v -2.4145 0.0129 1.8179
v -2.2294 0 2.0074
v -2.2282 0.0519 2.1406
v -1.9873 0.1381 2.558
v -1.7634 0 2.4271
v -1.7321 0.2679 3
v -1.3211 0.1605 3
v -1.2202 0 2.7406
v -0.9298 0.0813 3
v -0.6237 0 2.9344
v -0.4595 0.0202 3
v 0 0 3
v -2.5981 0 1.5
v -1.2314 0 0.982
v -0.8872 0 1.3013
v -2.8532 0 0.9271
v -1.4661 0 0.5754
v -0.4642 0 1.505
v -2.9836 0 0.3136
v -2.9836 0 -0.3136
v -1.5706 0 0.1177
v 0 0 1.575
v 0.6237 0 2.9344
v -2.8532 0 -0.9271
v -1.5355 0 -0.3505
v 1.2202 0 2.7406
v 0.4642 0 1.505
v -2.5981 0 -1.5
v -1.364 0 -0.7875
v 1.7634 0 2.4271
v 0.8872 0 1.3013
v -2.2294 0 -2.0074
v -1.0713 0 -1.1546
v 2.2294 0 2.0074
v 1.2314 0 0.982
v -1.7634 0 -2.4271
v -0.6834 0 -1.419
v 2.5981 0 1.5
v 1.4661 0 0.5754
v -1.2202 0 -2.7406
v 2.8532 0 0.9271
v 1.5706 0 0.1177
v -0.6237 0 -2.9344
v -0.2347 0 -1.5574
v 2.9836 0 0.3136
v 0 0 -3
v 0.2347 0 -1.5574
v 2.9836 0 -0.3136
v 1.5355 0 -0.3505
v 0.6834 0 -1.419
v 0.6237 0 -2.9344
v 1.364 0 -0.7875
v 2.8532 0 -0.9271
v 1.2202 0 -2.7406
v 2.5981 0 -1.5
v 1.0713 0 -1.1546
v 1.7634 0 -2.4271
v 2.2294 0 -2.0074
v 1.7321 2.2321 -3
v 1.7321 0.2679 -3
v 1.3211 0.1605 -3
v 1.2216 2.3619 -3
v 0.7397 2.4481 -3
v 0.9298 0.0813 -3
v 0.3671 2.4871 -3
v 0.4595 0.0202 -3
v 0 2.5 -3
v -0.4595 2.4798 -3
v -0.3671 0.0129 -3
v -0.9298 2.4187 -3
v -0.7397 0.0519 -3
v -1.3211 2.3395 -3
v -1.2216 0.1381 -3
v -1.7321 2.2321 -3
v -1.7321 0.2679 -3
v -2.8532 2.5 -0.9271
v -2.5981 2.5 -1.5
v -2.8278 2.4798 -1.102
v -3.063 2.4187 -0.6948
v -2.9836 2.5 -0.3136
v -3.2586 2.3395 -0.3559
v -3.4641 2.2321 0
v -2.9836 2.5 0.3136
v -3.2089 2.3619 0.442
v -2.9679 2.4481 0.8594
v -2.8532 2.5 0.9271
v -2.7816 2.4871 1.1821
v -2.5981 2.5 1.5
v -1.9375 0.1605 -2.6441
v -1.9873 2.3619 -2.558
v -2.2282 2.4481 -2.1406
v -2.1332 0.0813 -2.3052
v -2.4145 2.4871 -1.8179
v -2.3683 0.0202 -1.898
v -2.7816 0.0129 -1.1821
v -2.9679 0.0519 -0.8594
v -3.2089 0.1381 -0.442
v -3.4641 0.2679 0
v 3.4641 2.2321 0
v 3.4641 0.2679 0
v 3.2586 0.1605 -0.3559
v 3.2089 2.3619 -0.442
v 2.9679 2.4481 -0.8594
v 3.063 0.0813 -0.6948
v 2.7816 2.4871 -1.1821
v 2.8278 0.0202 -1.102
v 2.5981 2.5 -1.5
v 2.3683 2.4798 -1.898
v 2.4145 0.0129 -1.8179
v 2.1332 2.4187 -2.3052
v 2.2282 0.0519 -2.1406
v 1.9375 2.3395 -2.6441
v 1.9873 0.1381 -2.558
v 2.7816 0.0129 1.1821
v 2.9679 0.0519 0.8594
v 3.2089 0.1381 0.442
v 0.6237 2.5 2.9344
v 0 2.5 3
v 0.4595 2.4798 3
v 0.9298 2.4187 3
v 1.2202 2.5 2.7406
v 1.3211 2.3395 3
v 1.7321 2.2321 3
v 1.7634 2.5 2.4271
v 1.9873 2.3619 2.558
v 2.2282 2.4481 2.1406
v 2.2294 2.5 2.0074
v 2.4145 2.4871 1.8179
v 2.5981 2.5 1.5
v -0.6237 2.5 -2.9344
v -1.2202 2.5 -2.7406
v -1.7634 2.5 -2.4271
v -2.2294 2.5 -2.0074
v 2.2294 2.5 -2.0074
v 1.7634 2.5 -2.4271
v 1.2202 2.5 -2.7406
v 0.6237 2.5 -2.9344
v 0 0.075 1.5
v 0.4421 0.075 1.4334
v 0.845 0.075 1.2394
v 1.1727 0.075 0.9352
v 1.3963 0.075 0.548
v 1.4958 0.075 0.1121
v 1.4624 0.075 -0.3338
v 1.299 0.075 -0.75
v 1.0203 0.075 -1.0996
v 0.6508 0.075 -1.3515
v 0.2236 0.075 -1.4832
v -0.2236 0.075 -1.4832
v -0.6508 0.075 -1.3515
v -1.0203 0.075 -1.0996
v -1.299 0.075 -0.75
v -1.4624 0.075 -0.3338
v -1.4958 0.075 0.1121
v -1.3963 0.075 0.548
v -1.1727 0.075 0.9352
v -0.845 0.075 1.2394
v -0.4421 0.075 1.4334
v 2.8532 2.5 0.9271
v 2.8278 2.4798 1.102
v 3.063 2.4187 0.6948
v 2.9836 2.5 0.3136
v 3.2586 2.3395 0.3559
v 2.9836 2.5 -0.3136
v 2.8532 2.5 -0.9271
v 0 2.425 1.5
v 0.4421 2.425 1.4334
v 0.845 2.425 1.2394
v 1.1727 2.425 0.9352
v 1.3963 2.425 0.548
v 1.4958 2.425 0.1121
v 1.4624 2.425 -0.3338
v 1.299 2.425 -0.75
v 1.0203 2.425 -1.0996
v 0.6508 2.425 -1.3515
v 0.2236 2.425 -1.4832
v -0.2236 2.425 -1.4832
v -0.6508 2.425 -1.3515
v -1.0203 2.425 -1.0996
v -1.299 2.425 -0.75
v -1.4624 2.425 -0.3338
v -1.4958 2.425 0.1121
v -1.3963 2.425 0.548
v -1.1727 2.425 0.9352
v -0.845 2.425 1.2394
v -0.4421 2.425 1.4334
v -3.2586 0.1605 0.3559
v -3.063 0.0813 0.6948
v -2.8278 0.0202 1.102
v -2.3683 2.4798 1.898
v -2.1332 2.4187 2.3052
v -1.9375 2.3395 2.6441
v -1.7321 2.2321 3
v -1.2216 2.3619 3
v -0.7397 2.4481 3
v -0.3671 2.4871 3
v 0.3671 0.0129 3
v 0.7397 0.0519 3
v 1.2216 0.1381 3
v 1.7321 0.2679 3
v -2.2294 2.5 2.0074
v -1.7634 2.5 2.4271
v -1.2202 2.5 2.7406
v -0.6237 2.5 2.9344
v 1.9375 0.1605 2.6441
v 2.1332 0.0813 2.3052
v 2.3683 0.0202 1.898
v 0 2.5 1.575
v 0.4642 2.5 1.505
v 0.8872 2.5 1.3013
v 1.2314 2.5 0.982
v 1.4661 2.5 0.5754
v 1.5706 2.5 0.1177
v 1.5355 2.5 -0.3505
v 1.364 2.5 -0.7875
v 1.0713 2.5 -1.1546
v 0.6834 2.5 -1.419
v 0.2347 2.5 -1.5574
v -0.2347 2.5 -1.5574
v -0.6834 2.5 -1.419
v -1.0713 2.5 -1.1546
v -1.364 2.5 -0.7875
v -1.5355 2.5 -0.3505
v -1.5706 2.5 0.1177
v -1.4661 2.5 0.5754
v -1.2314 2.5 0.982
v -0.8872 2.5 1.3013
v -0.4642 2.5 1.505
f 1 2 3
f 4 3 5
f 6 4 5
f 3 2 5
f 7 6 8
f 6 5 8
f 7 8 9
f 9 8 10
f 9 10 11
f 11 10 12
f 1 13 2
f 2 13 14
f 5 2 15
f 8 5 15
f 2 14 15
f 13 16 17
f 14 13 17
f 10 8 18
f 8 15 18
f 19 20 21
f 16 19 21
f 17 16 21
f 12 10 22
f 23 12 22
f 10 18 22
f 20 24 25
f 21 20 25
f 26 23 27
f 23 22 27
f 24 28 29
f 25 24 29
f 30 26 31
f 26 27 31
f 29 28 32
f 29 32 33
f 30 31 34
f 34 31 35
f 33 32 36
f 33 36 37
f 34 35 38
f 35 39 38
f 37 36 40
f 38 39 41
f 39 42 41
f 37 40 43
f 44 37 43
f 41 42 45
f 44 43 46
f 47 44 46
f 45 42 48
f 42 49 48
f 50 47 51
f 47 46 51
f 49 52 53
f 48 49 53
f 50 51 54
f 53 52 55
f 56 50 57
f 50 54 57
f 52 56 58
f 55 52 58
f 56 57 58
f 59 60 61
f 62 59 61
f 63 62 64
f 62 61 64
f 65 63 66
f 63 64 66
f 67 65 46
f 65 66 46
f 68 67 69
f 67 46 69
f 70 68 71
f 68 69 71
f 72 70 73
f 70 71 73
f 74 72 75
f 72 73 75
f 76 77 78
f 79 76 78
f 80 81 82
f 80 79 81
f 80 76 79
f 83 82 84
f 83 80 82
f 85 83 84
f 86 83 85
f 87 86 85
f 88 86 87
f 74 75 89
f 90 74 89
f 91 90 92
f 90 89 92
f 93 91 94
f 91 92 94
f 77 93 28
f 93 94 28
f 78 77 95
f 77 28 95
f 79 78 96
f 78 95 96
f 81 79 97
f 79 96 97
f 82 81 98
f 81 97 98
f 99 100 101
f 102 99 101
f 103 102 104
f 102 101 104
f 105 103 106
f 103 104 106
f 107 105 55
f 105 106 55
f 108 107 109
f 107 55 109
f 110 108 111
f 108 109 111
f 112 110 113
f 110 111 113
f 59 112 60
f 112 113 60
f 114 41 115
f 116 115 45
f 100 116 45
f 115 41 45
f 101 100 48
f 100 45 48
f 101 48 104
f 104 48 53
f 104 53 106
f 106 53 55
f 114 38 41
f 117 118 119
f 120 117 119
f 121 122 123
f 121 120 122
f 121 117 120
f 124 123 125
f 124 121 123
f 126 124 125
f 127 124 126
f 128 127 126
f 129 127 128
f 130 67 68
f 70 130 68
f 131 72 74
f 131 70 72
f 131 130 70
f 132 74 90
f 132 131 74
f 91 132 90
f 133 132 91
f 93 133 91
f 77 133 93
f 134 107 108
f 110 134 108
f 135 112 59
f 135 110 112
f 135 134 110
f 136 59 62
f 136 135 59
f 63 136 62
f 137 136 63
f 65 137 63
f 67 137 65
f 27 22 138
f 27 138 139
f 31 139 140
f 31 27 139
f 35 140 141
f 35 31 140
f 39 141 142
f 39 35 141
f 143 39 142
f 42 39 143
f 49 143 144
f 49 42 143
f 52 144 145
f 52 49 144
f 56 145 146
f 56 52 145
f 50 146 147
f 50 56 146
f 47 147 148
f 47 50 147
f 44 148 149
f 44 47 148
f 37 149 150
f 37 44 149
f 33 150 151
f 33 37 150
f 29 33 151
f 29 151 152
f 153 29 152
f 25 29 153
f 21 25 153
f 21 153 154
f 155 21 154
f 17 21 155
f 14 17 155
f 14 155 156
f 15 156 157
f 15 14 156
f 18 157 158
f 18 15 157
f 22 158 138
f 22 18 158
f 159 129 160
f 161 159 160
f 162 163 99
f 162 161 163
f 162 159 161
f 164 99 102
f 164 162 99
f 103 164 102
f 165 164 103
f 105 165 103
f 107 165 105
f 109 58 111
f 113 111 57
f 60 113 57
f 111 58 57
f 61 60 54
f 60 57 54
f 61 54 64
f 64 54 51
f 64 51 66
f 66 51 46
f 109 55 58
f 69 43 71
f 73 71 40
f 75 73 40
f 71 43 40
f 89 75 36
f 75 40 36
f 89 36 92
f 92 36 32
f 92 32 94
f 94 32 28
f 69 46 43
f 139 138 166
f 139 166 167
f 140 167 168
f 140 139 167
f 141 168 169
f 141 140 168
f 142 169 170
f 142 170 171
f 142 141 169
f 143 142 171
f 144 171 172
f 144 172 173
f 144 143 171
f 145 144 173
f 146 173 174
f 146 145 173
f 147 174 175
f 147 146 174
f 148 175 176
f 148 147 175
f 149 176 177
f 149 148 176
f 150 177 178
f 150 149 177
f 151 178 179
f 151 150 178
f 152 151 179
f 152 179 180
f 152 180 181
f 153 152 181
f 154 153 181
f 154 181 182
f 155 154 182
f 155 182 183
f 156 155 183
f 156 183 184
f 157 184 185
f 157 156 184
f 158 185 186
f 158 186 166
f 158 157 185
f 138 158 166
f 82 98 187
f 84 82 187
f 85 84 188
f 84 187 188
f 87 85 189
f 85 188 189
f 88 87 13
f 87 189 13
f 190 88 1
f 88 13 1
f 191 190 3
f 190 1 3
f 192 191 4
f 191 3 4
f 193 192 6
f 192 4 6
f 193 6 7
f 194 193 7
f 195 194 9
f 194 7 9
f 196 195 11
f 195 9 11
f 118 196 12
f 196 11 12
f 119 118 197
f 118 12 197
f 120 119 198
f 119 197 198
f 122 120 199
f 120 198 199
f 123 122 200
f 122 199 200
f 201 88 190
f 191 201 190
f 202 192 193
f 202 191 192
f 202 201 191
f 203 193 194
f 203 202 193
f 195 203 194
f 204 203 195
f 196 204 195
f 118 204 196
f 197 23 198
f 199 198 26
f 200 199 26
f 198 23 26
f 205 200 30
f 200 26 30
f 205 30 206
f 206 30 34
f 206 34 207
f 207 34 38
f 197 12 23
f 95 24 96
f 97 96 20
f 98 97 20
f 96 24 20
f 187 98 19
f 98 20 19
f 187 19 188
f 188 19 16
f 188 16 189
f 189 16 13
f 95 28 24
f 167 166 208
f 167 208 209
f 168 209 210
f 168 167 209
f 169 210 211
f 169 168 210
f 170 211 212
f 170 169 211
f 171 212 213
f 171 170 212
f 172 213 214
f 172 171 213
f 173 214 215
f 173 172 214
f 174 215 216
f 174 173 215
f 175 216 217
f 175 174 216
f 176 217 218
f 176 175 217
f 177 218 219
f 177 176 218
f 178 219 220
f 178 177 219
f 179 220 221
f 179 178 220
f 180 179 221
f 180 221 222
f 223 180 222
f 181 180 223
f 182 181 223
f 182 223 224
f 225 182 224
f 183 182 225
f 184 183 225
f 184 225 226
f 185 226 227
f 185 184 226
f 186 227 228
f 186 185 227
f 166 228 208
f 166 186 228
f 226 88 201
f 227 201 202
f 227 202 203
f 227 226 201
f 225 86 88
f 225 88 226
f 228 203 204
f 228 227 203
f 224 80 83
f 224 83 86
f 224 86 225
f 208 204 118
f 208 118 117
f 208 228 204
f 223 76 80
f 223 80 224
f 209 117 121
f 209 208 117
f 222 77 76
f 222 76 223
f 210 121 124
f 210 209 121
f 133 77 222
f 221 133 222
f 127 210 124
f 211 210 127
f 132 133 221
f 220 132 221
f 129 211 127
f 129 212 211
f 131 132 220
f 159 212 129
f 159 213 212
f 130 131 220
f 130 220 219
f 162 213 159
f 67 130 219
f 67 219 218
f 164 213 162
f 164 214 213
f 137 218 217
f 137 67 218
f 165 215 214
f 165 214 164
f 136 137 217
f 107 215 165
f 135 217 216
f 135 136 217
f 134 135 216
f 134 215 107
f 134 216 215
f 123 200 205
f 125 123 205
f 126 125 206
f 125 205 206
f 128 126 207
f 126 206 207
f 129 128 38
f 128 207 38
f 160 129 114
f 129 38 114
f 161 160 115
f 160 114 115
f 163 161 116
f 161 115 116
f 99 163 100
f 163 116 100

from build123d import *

# Parameters (mm, degrees)
SKETCH2_R           = 1.5
BOSS_EXTRUDE1_DEPTH = 2.5
SKETCH3_OUTSIDE_W   = 22.086
SKETCH3_OUTSIDE_H   = 21.158
SKETCH3_OUTSIDE_R   = 3
CUT_EXTRUDE1_DEPTH  = 3.25
CUT_EXTRUDE1_DRAFT  = 60
SKETCH4_OUTSIDE_W   = 22.086
SKETCH4_OUTSIDE_H   = 21.158
SKETCH4_OUTSIDE_R   = 3
CUT_EXTRUDE2_DEPTH  = 3.25
CUT_EXTRUDE2_DRAFT  = -60
CHAMFER1_SIZE       = 0.075


with BuildPart() as part:
    # Sketch2 → Boss-Extrude1 (new body)
    with BuildSketch(Plane(origin=(0, 0, 0), x_dir=(1, 0, 0), z_dir=(0, 1, 0))):
        Polygon((3.464101615, 0), (1.732050808, 3), (-1.732050808, 3), (-3.464101615, 0), (-1.732050808, -3), (1.732050808, -3), align=None)
        with Locations(Location((0, 0, 0), (0, 0, 270))):
            Circle(SKETCH2_R, mode=Mode.SUBTRACT)
    extrude(amount=BOSS_EXTRUDE1_DEPTH)


with BuildPart() as cut_extrude1_tool:
    # Sketch3 outside → Cut-Extrude1 (with draft: the straight prism first)
    with BuildSketch(Plane(origin=(0, 0, 0), x_dir=(1, 0, 0), z_dir=(0, 1, 0))):
        Rectangle(SKETCH3_OUTSIDE_W, SKETCH3_OUTSIDE_H)
        Circle(SKETCH3_OUTSIDE_R, mode=Mode.SUBTRACT)
    extrude(amount=CUT_EXTRUDE1_DEPTH)
    # Cut-Extrude1: the draft: its side faces are tilted about the plane it starts from
    cut_extrude1_sides = [cut_extrude1_tool.faces().sort_by_distance(p)[0] for p in [
        (0, 1.625, 10.579),
        (11.043, 1.625, 0),
        (0, 1.625, -10.579),
        (-11.043, 1.625, 0),
        (-3, 1.625, 0),
    ]]
    draft(cut_extrude1_sides, Plane(origin=(0, 0, 0), x_dir=(1, 0, 0), z_dir=(0, 1, 0)), CUT_EXTRUDE1_DRAFT)


with BuildPart() as part_1:
    add(part.part)

    # Cut-Extrude1: cut by cut_extrude1_tool
    add(cut_extrude1_tool.part, mode=Mode.SUBTRACT)


with BuildPart() as cut_extrude2_tool:
    # Sketch4 outside → Cut-Extrude2 (with draft: the straight prism first)
    with BuildSketch(Plane(origin=(0, 2.5, 0), x_dir=(1, 0, 0), z_dir=(0, 1, 0))):
        Rectangle(SKETCH4_OUTSIDE_W, SKETCH4_OUTSIDE_H)
        Circle(SKETCH4_OUTSIDE_R, mode=Mode.SUBTRACT)
    extrude(amount=-CUT_EXTRUDE2_DEPTH)
    # Cut-Extrude2: the draft: its side faces are tilted about the plane it starts from
    cut_extrude2_sides = [cut_extrude2_tool.faces().sort_by_distance(p)[0] for p in [
        (0, 0.875, 10.579),
        (11.043, 0.875, 0),
        (0, 0.875, -10.579),
        (-11.043, 0.875, 0),
        (-3, 0.875, 0),
    ]]
    draft(cut_extrude2_sides, Plane(origin=(0, 2.5, 0), x_dir=(1, 0, 0), z_dir=(0, 1, 0)), CUT_EXTRUDE2_DRAFT)


with BuildPart() as part_2:
    add(part_1.part)

    # Cut-Extrude2: cut by cut_extrude2_tool
    add(cut_extrude2_tool.part, mode=Mode.SUBTRACT)

    # Chamfer1
    chamfer1_edges = [part_2.edges().sort_by_distance(p)[0] for p in [
        (0, 0, -1.5),
        (0, 2.5, -1.5),
    ]]
    chamfer(chamfer1_edges, length=CHAMFER1_SIZE)


solid = part_2.part
